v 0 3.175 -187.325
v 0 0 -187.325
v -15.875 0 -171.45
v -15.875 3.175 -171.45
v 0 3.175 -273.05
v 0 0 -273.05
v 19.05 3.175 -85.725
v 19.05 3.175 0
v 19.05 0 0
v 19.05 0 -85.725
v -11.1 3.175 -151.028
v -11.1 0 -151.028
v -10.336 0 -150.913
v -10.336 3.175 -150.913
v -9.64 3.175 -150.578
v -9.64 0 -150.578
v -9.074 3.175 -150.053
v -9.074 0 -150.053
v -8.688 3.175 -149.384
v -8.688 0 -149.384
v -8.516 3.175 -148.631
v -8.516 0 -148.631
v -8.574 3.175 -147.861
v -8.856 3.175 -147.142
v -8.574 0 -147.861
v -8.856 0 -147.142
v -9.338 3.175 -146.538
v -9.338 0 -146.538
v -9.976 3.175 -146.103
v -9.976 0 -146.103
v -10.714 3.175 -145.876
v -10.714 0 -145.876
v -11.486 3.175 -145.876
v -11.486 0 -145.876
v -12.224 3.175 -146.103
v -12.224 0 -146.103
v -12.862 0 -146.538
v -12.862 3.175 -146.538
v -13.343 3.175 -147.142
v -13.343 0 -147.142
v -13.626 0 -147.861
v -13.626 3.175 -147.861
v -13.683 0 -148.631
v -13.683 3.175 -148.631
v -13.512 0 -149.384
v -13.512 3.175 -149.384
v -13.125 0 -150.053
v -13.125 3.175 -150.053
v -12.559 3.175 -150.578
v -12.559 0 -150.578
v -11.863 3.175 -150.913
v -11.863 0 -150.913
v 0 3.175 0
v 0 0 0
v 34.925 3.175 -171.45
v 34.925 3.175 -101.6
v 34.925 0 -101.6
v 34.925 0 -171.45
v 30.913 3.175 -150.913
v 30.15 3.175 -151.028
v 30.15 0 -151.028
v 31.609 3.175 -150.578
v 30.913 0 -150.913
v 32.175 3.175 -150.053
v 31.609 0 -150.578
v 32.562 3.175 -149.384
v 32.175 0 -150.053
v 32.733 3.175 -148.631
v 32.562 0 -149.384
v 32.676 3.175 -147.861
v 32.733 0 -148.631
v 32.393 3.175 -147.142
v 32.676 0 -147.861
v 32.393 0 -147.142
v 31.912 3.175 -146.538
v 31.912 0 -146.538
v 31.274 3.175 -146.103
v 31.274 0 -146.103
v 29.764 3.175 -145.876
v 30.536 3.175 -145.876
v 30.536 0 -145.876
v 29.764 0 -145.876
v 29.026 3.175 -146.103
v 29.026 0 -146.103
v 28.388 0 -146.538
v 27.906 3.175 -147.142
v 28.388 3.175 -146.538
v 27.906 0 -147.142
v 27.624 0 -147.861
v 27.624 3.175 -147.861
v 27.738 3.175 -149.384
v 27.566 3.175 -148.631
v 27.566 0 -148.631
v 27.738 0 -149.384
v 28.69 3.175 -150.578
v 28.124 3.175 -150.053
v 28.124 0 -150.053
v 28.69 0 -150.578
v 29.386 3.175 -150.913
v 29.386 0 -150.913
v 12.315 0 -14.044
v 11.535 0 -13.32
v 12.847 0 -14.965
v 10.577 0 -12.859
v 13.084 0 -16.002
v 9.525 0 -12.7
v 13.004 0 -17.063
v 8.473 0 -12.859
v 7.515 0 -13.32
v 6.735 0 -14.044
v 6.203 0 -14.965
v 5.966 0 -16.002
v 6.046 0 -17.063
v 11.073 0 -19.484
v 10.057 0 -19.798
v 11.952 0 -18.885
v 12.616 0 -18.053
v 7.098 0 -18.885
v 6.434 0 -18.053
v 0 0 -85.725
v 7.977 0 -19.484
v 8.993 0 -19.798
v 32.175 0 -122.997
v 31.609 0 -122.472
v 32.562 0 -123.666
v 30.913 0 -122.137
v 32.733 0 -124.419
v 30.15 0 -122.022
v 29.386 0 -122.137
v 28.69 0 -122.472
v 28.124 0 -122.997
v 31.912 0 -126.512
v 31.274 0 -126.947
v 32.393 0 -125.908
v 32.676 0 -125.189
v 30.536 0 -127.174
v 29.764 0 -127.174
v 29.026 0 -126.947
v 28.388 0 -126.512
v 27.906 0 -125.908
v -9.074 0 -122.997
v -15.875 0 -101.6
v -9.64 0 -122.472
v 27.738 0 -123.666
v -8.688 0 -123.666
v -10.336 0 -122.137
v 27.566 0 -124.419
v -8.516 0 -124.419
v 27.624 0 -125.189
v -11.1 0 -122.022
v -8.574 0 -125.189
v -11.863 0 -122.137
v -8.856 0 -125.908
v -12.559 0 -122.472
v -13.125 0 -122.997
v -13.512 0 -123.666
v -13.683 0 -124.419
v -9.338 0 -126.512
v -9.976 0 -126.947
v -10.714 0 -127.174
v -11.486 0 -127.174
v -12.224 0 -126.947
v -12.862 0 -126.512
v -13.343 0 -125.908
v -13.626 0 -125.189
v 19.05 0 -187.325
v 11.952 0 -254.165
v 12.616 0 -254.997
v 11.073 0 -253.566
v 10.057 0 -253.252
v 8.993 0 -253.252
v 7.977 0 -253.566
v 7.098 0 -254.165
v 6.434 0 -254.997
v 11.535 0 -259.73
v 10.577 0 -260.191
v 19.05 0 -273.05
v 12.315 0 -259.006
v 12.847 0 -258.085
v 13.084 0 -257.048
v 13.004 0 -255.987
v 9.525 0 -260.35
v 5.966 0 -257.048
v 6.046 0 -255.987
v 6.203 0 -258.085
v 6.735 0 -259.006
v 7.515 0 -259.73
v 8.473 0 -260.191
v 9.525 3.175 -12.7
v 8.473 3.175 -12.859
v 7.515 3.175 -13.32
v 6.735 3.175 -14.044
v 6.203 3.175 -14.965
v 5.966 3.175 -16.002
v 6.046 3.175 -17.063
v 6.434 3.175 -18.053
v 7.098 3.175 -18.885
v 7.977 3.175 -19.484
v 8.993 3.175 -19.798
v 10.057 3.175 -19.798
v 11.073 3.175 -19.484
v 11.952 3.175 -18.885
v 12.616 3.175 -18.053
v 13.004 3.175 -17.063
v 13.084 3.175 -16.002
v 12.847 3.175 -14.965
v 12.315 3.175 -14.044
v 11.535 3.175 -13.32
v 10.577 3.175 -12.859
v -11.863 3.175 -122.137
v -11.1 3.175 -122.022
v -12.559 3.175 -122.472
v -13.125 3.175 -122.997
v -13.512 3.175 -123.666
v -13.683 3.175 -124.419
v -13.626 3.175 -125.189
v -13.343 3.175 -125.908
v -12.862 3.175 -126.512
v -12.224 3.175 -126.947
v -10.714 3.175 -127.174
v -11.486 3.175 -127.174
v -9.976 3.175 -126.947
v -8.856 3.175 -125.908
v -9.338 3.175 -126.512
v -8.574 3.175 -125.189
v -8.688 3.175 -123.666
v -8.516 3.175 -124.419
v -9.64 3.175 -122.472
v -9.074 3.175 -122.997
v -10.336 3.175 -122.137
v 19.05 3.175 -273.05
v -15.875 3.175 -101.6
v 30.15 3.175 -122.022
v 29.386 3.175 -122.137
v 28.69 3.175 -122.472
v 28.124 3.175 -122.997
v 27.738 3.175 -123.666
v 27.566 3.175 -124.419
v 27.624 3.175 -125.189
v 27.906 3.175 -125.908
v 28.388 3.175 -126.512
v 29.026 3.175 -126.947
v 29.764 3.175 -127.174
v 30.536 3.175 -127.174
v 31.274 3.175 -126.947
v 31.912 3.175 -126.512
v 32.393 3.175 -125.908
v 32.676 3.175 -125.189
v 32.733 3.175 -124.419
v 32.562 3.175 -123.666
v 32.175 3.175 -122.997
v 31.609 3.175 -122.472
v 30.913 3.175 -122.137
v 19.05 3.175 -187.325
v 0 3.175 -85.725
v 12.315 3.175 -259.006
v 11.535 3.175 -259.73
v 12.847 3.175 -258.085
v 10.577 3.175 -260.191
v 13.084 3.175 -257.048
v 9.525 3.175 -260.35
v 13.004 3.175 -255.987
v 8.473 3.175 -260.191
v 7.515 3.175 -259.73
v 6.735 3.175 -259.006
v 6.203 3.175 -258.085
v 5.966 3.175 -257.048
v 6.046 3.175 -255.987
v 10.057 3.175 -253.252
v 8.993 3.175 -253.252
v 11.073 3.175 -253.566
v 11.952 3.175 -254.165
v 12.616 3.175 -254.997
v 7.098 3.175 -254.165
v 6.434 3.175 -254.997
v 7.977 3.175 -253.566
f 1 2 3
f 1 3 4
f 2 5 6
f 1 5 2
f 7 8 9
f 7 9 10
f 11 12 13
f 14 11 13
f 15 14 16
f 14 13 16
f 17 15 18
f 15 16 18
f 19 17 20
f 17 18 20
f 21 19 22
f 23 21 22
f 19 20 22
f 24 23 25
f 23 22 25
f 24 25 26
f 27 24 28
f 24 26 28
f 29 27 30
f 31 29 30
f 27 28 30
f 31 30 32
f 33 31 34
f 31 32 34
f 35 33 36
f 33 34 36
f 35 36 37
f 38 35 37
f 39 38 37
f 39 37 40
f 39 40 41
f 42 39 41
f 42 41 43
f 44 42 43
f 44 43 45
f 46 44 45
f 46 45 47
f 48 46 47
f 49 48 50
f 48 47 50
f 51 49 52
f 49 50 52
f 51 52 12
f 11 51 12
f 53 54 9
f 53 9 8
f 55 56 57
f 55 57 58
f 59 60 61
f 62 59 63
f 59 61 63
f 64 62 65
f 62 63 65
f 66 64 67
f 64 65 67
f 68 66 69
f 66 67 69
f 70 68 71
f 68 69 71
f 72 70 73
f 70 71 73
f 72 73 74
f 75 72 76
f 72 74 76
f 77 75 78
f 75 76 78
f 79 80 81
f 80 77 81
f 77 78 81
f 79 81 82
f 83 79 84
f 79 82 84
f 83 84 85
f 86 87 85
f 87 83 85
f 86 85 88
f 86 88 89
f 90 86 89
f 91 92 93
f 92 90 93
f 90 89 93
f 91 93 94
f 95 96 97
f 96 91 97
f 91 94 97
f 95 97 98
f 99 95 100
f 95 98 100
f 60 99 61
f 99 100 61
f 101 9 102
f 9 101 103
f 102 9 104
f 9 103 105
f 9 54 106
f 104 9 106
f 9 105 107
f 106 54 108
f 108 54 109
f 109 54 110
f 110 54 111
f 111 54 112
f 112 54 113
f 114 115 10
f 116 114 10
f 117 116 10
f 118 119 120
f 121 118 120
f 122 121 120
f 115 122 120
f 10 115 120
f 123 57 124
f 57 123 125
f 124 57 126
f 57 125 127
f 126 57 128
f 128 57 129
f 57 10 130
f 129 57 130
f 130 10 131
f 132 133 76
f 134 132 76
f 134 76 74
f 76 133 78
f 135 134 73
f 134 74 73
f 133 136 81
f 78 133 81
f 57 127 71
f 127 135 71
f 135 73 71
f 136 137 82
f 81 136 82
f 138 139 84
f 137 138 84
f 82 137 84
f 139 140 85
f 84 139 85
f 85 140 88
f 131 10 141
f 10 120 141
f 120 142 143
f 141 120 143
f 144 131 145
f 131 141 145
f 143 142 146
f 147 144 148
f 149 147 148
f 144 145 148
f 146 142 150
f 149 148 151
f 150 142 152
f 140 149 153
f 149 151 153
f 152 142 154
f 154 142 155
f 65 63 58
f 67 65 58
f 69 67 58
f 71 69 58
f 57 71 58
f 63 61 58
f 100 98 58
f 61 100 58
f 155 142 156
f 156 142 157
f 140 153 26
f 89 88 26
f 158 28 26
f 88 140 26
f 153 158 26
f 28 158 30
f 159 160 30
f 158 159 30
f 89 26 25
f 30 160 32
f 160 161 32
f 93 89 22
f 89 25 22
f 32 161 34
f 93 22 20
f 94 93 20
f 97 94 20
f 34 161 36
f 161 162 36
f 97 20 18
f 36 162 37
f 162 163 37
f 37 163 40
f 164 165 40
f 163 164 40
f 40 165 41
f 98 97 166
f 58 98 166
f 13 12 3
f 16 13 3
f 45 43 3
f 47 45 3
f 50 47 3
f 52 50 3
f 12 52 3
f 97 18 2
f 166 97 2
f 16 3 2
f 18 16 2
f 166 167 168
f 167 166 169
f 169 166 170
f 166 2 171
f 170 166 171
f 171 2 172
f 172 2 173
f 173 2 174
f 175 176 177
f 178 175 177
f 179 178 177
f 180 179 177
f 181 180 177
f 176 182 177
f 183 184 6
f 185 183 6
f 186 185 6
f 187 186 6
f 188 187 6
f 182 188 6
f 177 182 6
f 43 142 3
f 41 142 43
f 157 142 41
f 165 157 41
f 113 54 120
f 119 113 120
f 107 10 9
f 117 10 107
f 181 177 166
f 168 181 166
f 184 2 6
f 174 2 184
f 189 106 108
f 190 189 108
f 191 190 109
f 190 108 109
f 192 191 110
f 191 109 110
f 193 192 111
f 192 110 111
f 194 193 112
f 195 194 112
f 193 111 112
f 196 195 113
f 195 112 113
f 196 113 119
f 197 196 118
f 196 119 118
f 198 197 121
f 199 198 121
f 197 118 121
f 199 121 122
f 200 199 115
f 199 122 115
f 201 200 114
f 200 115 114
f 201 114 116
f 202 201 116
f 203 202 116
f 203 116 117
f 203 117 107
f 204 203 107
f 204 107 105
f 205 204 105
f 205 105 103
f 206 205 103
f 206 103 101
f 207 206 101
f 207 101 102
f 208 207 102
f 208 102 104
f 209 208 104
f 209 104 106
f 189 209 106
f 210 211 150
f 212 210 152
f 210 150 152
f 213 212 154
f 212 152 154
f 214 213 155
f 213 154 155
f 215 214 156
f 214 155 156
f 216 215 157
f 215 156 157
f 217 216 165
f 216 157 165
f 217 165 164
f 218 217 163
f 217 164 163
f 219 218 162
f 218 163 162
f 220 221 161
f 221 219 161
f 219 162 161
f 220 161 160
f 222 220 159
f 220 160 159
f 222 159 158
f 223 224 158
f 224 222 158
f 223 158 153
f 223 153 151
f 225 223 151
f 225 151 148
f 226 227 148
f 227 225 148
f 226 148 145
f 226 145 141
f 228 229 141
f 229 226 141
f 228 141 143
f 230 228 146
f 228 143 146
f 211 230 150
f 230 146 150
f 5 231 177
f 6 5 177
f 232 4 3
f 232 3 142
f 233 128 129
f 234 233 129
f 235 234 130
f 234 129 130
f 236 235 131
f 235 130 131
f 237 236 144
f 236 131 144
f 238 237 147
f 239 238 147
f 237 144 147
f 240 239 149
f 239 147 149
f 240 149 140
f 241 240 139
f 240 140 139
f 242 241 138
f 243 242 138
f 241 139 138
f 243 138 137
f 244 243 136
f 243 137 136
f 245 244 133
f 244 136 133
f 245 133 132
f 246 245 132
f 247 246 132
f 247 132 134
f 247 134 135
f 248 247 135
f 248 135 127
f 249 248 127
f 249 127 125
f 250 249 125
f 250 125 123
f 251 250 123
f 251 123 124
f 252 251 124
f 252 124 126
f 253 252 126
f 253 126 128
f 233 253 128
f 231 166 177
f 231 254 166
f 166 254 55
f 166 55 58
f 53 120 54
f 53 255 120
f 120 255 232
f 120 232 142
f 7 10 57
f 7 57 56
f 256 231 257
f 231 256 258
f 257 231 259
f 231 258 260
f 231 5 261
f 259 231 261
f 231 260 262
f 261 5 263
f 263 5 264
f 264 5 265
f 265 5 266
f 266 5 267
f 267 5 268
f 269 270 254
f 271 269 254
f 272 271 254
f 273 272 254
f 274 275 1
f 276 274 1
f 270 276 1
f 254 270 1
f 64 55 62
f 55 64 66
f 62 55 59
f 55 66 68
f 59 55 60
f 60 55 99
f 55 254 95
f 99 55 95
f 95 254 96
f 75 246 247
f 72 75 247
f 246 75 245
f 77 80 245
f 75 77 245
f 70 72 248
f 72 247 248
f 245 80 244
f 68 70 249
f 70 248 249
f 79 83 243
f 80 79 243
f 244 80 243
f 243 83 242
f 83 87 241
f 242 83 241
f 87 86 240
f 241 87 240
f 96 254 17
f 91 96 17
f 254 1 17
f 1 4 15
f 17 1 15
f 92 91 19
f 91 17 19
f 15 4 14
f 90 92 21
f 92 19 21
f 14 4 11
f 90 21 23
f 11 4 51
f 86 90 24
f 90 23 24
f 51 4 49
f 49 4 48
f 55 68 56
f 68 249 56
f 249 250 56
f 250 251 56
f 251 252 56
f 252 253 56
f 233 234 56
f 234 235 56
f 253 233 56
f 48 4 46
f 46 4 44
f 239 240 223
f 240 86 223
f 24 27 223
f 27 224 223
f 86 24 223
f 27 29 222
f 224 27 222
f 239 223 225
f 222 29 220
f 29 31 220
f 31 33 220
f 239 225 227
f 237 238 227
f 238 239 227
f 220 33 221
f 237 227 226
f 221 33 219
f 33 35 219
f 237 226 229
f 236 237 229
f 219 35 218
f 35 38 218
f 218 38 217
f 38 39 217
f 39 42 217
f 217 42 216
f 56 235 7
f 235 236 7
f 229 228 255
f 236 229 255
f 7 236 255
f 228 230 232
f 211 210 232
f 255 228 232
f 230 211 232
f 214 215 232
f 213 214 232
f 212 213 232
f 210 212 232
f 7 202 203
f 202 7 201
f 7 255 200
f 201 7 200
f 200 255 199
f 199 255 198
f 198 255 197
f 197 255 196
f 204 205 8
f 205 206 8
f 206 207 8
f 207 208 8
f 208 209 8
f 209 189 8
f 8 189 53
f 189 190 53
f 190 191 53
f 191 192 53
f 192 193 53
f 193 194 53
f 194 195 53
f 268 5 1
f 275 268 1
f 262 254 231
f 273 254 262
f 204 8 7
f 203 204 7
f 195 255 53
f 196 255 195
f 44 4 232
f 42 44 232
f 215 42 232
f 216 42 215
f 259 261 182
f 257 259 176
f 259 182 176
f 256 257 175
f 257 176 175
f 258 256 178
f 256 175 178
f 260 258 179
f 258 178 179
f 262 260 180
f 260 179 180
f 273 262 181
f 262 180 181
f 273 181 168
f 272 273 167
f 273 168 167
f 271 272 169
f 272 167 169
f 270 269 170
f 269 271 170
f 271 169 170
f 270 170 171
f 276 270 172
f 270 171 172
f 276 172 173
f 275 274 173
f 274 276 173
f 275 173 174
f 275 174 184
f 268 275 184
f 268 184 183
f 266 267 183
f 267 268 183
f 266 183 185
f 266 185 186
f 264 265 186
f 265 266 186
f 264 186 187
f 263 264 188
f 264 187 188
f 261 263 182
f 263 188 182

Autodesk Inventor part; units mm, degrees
ref_plane "YZ Plane" through (0, 0, 0) normal (1, 0, 0) x (0, 1, 0)
ref_plane "XZ Plane" through (0, 0, 0) normal (0, 1, 0) x (-1, 0, 0)
ref_plane "XY Plane" through (0, 0, 0) normal (0, 0, 1) x (1, 0, 0)
sketch "Sketch1" plane through (0, 0, 0) normal (0, 1, 0) x (-1, 0, 0)
  line L0 (0, 0) -> (-19.05, 0)
  line L1 (-19.05, 0) -> (-19.05, -273.05)
  line L2 (-19.05, -273.05) -> (0, -273.05)
  line L3 (0, -273.05) -> (0, 0)
  dimension "d0" = 19.05
  dimension "d1" = 273.05
extrude "Extrusion1" add sketch "Sketch1" along normal blind 3.175
sketch "Sketch4" plane through (19.05, 0, 0) normal (1, 0, 0) x (0, 0, -1)
  line L0 (273.05, 0) -> (273.05, 3.175) projected
  line L1 (0, 3.175) -> (273.05, 3.175)
  line L2 (273.05, 3.175) -> (273.05, 0)
  line L3 (273.05, 0) -> (0, 0)
  line L4 (0, 0) -> (0, 3.175)
extrude "Extrusion2" add sketch "Sketch4" along normal blind 6.35
sketch "Sketch5" plane through (0, 0, -273.05) normal (-1, 0, 0) x (0, 0, 1)
  line L0 (0, 0) -> (0, 3.175) projected
  line L1 (0, 3.175) -> (273.05, 3.175)
  line L2 (273.05, 3.175) -> (273.05, 0)
  line L3 (273.05, 0) -> (0, 0)
  line L4 (0, 0) -> (0, 3.175)
extrude "Extrusion3" add sketch "Sketch5" along normal blind 6.35
ref_plane "Work Plane1" through (9.525, 0, 0) normal (1, 0, 0) x (0, 0, -1)
ref_plane "Work Plane2" through (25.4, 0, -136.525) normal (0, 0, 1) x (1, 0, 0)
sketch "Sketch6" plane through (25.4, 0, 0) normal (1, 0, 0) x (0, 0, -1)
  line L0 (0, 0) -> (273.05, 0) projected
  line L1 (0, 3.175) -> (273.05, 3.175)
  line L2 (273.05, 3.175) -> (273.05, 0)
  line L3 (273.05, 0) -> (0, 0)
  line L4 (0, 0) -> (0, 3.175)
extrude "Extrusion4" add sketch "Sketch6" along normal blind 9.525
sketch "Sketch7" plane through (-6.35, 0, -273.05) normal (-1, 0, 0) x (0, 0, 1)
  line L0 (273.05, 3.175) -> (0, 3.175) projected
  line L1 (0, 3.175) -> (0, 0) projected
  line L2 (273.05, 3.175) -> (0, 3.175)
  line L3 (0, 3.175) -> (0, 0)
  line L4 (0, 0) -> (273.05, 0)
  line L5 (273.05, 0) -> (273.05, 3.175)
extrude "Extrusion5" add sketch "Sketch7" along normal blind 9.525
sketch "Sketch8" plane through (0, 3.175, 0) normal (0, 1, 0) x (1, 0, 0)
  line L0 (34.925, 273.05) -> (34.925, 0) projected
  line L1 (34.925, 0) -> (-15.875, 0) projected
  point P0 (0, 0)
  point P1 (30.1498, 124.6124)
  dimension "d30" = 4.7752
  dimension "d31" = 124.6124
hole "Hole3" at (30.1498, 3.175, -124.6124) direction (0, -1, 0) diameter 5.1816 end through all
mirror "Mirror4" about plane through (9.525, 0, 0) normal (1, 0, 0) of "Hole3"
mirror "Mirror5" about plane through (25.4, 0, -136.525) normal (0, 0, 1) of "Hole3", "Mirror4"
sketch "Sketch10" plane through (34.925, 0, 0) normal (1, 0, 0) x (0, 0, -1)
  line L0 (0, 3.175) -> (101.6, 3.175)
  line L1 (101.6, 3.175) -> (101.6, 0)
  line L2 (101.6, 0) -> (0, 0)
  line L3 (0, 0) -> (0, 3.175)
  dimension "d40" = 101.6
  dimension "d41" = 3.175
extrude "Extrusion6" cut sketch "Sketch10" against normal blind 15.875
chamfer "Chamfer1" distance 15.875 angle 45 1 edges at (19.05, 1.5875, -101.6)
mirror "Mirror6" about plane through (9.525, 0, 0) normal (1, 0, 0) of "Extrusion6", "Chamfer1"
mirror "Mirror7" about plane through (25.4, 0, -136.525) normal (0, 0, 1) of "Extrusion6", "Chamfer1", "Mirror6"
sketch "Sketch11" plane through (0, 3.175, 0) normal (0, 1, 0) x (1, 0, 0)
  line L0 (19.05, 0) -> (0, 0) projected
  line L1 (0, 85.725) -> (0, 0) projected
  point P0 (9.525, 16.2687)
  dimension "d47" = 16.2687
  dimension "d48" = 9.525
hole "Hole4" at (9.525, 3.175, -16.2687) direction (0, -1, 0) diameter 7.1374 end through all
mirror "Mirror8" about plane through (25.4, 0, -136.525) normal (0, 0, 1) of "Hole4"
properties part number "top beam"
